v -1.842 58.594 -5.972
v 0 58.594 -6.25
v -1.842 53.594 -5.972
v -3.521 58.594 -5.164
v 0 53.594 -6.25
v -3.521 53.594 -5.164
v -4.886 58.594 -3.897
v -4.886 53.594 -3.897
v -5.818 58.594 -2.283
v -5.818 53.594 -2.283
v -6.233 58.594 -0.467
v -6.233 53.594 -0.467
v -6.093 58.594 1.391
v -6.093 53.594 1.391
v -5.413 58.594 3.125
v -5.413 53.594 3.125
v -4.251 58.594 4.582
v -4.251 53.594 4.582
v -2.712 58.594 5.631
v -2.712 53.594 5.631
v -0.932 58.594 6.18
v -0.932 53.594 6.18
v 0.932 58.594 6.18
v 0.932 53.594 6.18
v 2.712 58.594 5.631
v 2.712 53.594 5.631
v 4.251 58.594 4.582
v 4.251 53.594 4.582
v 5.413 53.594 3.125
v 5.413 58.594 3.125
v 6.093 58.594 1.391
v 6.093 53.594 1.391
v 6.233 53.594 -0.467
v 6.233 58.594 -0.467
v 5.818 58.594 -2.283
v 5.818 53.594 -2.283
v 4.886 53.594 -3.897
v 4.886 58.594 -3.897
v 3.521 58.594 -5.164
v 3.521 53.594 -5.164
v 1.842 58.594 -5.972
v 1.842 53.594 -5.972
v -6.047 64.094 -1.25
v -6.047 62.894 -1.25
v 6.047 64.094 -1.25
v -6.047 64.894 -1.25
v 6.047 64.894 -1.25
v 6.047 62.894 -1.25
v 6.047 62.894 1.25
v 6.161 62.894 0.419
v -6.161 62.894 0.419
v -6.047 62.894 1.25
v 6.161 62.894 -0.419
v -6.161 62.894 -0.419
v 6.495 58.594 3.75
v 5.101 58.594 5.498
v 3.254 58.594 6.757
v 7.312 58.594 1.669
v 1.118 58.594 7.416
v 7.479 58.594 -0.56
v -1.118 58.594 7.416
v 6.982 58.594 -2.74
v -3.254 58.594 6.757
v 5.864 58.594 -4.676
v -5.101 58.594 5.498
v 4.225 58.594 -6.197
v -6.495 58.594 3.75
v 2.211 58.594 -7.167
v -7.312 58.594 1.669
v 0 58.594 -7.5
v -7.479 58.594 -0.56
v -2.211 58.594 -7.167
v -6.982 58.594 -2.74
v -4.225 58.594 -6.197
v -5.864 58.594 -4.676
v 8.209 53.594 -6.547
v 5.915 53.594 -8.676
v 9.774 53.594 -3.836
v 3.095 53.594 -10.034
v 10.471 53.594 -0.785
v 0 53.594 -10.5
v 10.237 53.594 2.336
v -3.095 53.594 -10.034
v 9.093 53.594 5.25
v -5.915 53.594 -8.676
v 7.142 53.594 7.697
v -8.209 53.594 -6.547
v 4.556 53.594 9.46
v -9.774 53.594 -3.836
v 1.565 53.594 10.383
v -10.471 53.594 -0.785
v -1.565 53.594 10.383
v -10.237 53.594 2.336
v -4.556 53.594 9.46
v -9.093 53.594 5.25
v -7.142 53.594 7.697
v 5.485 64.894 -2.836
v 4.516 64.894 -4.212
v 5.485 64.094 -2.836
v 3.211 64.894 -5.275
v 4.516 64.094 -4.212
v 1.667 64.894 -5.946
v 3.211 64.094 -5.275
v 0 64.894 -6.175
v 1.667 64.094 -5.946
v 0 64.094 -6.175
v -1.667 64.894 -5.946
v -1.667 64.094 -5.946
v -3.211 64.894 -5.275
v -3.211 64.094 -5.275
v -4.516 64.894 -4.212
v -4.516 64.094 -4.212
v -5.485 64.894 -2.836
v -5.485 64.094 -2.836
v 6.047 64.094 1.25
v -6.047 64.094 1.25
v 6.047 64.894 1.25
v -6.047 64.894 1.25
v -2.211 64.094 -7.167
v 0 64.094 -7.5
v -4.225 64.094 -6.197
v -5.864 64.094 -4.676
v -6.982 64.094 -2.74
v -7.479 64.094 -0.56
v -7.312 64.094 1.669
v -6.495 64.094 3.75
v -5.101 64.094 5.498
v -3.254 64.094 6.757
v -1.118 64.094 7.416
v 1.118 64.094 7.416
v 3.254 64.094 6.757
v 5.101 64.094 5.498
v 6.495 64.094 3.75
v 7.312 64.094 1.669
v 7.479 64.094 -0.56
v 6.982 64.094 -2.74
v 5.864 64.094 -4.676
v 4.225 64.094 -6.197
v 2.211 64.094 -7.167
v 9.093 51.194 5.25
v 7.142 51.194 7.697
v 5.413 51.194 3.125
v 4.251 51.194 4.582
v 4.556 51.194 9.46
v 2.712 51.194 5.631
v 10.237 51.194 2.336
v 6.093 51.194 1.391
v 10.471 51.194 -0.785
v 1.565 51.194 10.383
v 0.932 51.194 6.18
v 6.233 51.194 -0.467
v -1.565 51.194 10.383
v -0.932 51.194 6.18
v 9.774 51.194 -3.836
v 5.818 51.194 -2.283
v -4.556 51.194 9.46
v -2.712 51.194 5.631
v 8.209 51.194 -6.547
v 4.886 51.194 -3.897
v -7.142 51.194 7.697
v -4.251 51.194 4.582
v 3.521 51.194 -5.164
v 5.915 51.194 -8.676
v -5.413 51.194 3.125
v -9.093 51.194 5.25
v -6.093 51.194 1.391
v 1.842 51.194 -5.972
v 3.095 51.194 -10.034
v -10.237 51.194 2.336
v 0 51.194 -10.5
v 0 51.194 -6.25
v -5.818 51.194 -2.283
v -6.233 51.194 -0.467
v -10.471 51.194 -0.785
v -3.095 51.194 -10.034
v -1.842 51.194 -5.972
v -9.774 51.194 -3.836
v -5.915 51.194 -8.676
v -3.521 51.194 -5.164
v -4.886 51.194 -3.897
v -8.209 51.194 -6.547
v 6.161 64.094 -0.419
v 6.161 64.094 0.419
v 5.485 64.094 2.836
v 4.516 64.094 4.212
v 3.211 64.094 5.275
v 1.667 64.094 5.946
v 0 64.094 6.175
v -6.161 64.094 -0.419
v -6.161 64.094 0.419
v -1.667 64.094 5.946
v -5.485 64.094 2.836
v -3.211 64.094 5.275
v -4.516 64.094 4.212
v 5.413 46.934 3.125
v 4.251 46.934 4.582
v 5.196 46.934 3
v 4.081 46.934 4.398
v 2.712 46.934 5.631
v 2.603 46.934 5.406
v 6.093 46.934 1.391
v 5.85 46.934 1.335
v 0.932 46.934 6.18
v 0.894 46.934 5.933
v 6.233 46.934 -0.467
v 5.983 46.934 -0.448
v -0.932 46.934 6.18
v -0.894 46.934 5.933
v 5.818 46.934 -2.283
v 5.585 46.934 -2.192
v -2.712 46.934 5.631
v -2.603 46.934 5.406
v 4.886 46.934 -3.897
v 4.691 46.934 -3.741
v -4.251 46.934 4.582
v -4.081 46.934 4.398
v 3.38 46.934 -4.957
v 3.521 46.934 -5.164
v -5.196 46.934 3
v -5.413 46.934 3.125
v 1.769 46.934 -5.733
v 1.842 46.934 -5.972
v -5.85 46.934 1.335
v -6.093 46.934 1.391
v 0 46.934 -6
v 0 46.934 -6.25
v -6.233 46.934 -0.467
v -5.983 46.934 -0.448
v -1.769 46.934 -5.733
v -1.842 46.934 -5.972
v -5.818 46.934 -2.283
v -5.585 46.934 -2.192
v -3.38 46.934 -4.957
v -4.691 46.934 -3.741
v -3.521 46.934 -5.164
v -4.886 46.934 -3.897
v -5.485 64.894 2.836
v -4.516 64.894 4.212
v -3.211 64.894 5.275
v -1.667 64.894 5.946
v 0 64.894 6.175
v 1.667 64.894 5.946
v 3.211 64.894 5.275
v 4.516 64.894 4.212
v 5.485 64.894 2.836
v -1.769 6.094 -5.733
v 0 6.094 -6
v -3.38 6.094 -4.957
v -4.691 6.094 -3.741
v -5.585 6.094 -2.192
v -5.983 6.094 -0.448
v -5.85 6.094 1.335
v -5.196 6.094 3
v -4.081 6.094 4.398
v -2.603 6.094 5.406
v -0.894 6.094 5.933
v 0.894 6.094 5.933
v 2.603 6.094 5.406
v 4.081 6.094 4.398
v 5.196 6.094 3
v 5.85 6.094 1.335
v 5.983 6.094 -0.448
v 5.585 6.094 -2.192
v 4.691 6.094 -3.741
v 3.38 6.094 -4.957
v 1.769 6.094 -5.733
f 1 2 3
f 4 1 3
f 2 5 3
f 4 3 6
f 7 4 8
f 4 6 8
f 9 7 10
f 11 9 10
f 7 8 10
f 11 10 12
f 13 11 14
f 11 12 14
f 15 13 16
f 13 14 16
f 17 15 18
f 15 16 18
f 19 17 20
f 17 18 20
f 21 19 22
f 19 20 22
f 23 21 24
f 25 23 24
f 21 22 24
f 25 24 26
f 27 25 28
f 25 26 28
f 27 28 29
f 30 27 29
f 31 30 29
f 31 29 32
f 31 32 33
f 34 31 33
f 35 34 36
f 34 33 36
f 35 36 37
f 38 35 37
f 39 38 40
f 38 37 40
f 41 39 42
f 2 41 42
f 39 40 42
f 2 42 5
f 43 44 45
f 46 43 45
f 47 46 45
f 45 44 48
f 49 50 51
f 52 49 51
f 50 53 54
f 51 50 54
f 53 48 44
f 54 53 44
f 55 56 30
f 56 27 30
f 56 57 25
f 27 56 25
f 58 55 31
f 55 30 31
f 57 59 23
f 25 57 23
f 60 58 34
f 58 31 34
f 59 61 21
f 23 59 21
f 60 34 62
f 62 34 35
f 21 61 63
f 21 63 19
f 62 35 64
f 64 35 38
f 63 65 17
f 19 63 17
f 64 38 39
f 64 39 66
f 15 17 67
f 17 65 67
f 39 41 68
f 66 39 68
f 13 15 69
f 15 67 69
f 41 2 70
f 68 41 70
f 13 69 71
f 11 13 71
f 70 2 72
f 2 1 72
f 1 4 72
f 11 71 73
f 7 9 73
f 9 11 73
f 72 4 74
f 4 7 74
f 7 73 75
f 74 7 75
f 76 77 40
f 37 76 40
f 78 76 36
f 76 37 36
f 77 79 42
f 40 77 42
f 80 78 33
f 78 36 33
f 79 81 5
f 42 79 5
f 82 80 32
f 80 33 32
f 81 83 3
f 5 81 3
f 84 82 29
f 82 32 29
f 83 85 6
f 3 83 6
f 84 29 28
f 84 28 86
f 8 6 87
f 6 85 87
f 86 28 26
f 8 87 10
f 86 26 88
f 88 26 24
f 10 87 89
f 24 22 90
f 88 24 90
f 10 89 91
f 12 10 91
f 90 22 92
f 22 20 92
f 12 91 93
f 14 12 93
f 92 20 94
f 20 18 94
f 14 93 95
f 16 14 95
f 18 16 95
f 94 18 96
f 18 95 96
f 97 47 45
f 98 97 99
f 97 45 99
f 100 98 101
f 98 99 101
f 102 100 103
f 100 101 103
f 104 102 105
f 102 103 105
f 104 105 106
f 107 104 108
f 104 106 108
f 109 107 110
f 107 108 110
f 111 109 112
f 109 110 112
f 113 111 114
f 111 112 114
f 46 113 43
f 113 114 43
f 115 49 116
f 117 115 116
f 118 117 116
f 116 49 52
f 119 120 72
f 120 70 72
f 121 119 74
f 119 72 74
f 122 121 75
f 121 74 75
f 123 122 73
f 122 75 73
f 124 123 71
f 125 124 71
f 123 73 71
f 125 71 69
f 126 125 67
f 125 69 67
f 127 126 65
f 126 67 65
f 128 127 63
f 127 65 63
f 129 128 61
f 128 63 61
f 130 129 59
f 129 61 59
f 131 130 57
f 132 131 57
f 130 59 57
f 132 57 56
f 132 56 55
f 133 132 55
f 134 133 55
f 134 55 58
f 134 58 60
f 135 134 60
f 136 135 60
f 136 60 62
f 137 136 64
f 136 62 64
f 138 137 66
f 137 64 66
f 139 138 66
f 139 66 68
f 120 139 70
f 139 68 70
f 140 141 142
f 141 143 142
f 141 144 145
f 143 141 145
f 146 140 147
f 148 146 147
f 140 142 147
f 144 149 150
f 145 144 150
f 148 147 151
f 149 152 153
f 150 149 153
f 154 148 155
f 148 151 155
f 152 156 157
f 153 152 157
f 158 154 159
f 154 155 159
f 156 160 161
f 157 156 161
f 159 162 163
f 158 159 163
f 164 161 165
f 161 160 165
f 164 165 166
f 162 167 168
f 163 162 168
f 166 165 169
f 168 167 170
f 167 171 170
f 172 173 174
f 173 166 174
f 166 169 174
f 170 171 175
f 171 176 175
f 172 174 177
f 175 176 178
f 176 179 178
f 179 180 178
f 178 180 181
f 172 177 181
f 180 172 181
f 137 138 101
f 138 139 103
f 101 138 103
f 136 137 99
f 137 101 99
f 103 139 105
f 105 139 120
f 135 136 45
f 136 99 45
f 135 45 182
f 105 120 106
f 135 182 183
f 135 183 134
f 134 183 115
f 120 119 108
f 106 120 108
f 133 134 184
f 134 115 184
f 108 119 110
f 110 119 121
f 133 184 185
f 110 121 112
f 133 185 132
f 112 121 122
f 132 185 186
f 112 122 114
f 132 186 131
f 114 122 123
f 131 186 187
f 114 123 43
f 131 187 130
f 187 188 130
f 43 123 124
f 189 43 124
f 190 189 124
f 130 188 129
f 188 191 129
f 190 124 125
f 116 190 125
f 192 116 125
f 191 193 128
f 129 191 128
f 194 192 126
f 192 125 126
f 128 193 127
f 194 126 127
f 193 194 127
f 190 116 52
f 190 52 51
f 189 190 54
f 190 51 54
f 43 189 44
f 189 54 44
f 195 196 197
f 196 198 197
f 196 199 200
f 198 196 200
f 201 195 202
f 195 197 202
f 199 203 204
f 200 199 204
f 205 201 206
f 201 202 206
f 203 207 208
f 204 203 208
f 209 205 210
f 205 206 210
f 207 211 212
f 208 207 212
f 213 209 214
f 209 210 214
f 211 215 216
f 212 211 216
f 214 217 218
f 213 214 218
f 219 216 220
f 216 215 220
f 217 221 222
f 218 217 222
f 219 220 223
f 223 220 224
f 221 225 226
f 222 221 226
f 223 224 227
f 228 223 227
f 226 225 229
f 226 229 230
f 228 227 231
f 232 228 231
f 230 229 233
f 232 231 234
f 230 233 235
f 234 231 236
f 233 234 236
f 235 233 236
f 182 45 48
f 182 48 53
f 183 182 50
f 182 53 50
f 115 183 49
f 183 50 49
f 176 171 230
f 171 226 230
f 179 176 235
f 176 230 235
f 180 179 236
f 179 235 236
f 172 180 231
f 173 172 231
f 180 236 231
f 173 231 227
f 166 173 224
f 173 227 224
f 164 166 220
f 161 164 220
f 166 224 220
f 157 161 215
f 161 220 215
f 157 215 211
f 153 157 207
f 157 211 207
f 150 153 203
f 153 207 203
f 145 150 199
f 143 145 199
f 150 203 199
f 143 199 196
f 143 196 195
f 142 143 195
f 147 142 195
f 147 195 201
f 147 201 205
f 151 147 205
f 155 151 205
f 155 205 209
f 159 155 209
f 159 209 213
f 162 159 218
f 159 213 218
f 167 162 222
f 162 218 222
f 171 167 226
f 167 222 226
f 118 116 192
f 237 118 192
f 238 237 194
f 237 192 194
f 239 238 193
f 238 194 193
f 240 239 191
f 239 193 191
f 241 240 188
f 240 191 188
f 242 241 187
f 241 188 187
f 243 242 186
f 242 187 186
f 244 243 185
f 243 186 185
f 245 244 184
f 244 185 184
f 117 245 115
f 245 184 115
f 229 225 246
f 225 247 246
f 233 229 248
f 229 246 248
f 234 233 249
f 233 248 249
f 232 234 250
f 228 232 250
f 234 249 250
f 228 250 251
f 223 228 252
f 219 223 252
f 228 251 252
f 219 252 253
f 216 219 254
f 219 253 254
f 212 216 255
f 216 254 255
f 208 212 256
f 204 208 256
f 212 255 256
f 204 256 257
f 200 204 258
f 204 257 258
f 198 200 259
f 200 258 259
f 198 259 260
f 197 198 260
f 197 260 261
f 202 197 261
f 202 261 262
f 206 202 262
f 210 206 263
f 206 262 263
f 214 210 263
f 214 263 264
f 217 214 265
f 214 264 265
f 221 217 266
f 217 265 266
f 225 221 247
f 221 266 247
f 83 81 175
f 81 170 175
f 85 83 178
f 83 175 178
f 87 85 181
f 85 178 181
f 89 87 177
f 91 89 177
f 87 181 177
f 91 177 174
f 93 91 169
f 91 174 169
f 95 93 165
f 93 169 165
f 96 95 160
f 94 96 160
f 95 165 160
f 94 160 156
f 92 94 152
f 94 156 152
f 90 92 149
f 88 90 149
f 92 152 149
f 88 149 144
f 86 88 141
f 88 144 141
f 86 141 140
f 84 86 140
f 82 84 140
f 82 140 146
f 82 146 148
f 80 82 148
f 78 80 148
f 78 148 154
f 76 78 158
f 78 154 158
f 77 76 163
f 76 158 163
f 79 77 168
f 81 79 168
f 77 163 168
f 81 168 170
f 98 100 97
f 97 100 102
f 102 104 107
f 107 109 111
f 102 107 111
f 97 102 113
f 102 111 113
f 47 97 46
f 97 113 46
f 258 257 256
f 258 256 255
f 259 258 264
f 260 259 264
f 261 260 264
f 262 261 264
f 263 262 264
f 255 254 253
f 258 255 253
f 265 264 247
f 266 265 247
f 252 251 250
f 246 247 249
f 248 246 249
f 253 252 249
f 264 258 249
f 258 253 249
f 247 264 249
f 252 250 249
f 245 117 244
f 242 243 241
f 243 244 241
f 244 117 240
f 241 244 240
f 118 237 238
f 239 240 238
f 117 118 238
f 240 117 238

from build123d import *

# Parameters (mm, degrees)
ENL_V_START             = -2
ENL_V_MAT_EXTRU_1_DEPTH = 2


with BuildPart() as part:
    # Esquisse2 → Révolution1 (revolve)
    with BuildSketch(Plane.XY, mode=Mode.PRIVATE) as r_volution1_sk:
        Polygon((0, 64.893975029), (6.175, 64.893975029), (6.175, 64.093975029), (7.5, 64.093975029), (7.5, 58.593975029), (6.25, 58.593975029), (6.25, 53.593975029), (10.5, 53.593975029), (10.5, 51.193975029), (6.25, 51.193975029), (6.25, 46.933975029), (6, 46.933975029), (6, 6.093975029), (0, 6.093975029), align=None)
    revolve(r_volution1_sk.sketch.rotate(Axis((0, 0, 0), (0, 1, 0)), 90), axis=Axis((0, 0, 0), (0, 1, 0)))

    # Esquisse3 → Enlèv. mat.-Extru.1 (cut)
    with BuildSketch(Plane(origin=(0, 64.893975029, 0), x_dir=(1, 0, 0), z_dir=(0, 1, 0)).offset(ENL_V_START)):
        with BuildLine():
            Line((-6.047158424, 1.25), (6.047158424, 1.25))
            ThreePointArc((6.047158424, 1.25), (6.175, 0), (6.047158424, -1.25))
            Line((6.047158424, -1.25), (-6.047158424, -1.25))
            ThreePointArc((-6.047158424, -1.25), (-6.175, 0), (-6.047158424, 1.25))
        make_face()
    extrude(amount=ENL_V_MAT_EXTRU_1_DEPTH, mode=Mode.SUBTRACT)


solid = part.part
